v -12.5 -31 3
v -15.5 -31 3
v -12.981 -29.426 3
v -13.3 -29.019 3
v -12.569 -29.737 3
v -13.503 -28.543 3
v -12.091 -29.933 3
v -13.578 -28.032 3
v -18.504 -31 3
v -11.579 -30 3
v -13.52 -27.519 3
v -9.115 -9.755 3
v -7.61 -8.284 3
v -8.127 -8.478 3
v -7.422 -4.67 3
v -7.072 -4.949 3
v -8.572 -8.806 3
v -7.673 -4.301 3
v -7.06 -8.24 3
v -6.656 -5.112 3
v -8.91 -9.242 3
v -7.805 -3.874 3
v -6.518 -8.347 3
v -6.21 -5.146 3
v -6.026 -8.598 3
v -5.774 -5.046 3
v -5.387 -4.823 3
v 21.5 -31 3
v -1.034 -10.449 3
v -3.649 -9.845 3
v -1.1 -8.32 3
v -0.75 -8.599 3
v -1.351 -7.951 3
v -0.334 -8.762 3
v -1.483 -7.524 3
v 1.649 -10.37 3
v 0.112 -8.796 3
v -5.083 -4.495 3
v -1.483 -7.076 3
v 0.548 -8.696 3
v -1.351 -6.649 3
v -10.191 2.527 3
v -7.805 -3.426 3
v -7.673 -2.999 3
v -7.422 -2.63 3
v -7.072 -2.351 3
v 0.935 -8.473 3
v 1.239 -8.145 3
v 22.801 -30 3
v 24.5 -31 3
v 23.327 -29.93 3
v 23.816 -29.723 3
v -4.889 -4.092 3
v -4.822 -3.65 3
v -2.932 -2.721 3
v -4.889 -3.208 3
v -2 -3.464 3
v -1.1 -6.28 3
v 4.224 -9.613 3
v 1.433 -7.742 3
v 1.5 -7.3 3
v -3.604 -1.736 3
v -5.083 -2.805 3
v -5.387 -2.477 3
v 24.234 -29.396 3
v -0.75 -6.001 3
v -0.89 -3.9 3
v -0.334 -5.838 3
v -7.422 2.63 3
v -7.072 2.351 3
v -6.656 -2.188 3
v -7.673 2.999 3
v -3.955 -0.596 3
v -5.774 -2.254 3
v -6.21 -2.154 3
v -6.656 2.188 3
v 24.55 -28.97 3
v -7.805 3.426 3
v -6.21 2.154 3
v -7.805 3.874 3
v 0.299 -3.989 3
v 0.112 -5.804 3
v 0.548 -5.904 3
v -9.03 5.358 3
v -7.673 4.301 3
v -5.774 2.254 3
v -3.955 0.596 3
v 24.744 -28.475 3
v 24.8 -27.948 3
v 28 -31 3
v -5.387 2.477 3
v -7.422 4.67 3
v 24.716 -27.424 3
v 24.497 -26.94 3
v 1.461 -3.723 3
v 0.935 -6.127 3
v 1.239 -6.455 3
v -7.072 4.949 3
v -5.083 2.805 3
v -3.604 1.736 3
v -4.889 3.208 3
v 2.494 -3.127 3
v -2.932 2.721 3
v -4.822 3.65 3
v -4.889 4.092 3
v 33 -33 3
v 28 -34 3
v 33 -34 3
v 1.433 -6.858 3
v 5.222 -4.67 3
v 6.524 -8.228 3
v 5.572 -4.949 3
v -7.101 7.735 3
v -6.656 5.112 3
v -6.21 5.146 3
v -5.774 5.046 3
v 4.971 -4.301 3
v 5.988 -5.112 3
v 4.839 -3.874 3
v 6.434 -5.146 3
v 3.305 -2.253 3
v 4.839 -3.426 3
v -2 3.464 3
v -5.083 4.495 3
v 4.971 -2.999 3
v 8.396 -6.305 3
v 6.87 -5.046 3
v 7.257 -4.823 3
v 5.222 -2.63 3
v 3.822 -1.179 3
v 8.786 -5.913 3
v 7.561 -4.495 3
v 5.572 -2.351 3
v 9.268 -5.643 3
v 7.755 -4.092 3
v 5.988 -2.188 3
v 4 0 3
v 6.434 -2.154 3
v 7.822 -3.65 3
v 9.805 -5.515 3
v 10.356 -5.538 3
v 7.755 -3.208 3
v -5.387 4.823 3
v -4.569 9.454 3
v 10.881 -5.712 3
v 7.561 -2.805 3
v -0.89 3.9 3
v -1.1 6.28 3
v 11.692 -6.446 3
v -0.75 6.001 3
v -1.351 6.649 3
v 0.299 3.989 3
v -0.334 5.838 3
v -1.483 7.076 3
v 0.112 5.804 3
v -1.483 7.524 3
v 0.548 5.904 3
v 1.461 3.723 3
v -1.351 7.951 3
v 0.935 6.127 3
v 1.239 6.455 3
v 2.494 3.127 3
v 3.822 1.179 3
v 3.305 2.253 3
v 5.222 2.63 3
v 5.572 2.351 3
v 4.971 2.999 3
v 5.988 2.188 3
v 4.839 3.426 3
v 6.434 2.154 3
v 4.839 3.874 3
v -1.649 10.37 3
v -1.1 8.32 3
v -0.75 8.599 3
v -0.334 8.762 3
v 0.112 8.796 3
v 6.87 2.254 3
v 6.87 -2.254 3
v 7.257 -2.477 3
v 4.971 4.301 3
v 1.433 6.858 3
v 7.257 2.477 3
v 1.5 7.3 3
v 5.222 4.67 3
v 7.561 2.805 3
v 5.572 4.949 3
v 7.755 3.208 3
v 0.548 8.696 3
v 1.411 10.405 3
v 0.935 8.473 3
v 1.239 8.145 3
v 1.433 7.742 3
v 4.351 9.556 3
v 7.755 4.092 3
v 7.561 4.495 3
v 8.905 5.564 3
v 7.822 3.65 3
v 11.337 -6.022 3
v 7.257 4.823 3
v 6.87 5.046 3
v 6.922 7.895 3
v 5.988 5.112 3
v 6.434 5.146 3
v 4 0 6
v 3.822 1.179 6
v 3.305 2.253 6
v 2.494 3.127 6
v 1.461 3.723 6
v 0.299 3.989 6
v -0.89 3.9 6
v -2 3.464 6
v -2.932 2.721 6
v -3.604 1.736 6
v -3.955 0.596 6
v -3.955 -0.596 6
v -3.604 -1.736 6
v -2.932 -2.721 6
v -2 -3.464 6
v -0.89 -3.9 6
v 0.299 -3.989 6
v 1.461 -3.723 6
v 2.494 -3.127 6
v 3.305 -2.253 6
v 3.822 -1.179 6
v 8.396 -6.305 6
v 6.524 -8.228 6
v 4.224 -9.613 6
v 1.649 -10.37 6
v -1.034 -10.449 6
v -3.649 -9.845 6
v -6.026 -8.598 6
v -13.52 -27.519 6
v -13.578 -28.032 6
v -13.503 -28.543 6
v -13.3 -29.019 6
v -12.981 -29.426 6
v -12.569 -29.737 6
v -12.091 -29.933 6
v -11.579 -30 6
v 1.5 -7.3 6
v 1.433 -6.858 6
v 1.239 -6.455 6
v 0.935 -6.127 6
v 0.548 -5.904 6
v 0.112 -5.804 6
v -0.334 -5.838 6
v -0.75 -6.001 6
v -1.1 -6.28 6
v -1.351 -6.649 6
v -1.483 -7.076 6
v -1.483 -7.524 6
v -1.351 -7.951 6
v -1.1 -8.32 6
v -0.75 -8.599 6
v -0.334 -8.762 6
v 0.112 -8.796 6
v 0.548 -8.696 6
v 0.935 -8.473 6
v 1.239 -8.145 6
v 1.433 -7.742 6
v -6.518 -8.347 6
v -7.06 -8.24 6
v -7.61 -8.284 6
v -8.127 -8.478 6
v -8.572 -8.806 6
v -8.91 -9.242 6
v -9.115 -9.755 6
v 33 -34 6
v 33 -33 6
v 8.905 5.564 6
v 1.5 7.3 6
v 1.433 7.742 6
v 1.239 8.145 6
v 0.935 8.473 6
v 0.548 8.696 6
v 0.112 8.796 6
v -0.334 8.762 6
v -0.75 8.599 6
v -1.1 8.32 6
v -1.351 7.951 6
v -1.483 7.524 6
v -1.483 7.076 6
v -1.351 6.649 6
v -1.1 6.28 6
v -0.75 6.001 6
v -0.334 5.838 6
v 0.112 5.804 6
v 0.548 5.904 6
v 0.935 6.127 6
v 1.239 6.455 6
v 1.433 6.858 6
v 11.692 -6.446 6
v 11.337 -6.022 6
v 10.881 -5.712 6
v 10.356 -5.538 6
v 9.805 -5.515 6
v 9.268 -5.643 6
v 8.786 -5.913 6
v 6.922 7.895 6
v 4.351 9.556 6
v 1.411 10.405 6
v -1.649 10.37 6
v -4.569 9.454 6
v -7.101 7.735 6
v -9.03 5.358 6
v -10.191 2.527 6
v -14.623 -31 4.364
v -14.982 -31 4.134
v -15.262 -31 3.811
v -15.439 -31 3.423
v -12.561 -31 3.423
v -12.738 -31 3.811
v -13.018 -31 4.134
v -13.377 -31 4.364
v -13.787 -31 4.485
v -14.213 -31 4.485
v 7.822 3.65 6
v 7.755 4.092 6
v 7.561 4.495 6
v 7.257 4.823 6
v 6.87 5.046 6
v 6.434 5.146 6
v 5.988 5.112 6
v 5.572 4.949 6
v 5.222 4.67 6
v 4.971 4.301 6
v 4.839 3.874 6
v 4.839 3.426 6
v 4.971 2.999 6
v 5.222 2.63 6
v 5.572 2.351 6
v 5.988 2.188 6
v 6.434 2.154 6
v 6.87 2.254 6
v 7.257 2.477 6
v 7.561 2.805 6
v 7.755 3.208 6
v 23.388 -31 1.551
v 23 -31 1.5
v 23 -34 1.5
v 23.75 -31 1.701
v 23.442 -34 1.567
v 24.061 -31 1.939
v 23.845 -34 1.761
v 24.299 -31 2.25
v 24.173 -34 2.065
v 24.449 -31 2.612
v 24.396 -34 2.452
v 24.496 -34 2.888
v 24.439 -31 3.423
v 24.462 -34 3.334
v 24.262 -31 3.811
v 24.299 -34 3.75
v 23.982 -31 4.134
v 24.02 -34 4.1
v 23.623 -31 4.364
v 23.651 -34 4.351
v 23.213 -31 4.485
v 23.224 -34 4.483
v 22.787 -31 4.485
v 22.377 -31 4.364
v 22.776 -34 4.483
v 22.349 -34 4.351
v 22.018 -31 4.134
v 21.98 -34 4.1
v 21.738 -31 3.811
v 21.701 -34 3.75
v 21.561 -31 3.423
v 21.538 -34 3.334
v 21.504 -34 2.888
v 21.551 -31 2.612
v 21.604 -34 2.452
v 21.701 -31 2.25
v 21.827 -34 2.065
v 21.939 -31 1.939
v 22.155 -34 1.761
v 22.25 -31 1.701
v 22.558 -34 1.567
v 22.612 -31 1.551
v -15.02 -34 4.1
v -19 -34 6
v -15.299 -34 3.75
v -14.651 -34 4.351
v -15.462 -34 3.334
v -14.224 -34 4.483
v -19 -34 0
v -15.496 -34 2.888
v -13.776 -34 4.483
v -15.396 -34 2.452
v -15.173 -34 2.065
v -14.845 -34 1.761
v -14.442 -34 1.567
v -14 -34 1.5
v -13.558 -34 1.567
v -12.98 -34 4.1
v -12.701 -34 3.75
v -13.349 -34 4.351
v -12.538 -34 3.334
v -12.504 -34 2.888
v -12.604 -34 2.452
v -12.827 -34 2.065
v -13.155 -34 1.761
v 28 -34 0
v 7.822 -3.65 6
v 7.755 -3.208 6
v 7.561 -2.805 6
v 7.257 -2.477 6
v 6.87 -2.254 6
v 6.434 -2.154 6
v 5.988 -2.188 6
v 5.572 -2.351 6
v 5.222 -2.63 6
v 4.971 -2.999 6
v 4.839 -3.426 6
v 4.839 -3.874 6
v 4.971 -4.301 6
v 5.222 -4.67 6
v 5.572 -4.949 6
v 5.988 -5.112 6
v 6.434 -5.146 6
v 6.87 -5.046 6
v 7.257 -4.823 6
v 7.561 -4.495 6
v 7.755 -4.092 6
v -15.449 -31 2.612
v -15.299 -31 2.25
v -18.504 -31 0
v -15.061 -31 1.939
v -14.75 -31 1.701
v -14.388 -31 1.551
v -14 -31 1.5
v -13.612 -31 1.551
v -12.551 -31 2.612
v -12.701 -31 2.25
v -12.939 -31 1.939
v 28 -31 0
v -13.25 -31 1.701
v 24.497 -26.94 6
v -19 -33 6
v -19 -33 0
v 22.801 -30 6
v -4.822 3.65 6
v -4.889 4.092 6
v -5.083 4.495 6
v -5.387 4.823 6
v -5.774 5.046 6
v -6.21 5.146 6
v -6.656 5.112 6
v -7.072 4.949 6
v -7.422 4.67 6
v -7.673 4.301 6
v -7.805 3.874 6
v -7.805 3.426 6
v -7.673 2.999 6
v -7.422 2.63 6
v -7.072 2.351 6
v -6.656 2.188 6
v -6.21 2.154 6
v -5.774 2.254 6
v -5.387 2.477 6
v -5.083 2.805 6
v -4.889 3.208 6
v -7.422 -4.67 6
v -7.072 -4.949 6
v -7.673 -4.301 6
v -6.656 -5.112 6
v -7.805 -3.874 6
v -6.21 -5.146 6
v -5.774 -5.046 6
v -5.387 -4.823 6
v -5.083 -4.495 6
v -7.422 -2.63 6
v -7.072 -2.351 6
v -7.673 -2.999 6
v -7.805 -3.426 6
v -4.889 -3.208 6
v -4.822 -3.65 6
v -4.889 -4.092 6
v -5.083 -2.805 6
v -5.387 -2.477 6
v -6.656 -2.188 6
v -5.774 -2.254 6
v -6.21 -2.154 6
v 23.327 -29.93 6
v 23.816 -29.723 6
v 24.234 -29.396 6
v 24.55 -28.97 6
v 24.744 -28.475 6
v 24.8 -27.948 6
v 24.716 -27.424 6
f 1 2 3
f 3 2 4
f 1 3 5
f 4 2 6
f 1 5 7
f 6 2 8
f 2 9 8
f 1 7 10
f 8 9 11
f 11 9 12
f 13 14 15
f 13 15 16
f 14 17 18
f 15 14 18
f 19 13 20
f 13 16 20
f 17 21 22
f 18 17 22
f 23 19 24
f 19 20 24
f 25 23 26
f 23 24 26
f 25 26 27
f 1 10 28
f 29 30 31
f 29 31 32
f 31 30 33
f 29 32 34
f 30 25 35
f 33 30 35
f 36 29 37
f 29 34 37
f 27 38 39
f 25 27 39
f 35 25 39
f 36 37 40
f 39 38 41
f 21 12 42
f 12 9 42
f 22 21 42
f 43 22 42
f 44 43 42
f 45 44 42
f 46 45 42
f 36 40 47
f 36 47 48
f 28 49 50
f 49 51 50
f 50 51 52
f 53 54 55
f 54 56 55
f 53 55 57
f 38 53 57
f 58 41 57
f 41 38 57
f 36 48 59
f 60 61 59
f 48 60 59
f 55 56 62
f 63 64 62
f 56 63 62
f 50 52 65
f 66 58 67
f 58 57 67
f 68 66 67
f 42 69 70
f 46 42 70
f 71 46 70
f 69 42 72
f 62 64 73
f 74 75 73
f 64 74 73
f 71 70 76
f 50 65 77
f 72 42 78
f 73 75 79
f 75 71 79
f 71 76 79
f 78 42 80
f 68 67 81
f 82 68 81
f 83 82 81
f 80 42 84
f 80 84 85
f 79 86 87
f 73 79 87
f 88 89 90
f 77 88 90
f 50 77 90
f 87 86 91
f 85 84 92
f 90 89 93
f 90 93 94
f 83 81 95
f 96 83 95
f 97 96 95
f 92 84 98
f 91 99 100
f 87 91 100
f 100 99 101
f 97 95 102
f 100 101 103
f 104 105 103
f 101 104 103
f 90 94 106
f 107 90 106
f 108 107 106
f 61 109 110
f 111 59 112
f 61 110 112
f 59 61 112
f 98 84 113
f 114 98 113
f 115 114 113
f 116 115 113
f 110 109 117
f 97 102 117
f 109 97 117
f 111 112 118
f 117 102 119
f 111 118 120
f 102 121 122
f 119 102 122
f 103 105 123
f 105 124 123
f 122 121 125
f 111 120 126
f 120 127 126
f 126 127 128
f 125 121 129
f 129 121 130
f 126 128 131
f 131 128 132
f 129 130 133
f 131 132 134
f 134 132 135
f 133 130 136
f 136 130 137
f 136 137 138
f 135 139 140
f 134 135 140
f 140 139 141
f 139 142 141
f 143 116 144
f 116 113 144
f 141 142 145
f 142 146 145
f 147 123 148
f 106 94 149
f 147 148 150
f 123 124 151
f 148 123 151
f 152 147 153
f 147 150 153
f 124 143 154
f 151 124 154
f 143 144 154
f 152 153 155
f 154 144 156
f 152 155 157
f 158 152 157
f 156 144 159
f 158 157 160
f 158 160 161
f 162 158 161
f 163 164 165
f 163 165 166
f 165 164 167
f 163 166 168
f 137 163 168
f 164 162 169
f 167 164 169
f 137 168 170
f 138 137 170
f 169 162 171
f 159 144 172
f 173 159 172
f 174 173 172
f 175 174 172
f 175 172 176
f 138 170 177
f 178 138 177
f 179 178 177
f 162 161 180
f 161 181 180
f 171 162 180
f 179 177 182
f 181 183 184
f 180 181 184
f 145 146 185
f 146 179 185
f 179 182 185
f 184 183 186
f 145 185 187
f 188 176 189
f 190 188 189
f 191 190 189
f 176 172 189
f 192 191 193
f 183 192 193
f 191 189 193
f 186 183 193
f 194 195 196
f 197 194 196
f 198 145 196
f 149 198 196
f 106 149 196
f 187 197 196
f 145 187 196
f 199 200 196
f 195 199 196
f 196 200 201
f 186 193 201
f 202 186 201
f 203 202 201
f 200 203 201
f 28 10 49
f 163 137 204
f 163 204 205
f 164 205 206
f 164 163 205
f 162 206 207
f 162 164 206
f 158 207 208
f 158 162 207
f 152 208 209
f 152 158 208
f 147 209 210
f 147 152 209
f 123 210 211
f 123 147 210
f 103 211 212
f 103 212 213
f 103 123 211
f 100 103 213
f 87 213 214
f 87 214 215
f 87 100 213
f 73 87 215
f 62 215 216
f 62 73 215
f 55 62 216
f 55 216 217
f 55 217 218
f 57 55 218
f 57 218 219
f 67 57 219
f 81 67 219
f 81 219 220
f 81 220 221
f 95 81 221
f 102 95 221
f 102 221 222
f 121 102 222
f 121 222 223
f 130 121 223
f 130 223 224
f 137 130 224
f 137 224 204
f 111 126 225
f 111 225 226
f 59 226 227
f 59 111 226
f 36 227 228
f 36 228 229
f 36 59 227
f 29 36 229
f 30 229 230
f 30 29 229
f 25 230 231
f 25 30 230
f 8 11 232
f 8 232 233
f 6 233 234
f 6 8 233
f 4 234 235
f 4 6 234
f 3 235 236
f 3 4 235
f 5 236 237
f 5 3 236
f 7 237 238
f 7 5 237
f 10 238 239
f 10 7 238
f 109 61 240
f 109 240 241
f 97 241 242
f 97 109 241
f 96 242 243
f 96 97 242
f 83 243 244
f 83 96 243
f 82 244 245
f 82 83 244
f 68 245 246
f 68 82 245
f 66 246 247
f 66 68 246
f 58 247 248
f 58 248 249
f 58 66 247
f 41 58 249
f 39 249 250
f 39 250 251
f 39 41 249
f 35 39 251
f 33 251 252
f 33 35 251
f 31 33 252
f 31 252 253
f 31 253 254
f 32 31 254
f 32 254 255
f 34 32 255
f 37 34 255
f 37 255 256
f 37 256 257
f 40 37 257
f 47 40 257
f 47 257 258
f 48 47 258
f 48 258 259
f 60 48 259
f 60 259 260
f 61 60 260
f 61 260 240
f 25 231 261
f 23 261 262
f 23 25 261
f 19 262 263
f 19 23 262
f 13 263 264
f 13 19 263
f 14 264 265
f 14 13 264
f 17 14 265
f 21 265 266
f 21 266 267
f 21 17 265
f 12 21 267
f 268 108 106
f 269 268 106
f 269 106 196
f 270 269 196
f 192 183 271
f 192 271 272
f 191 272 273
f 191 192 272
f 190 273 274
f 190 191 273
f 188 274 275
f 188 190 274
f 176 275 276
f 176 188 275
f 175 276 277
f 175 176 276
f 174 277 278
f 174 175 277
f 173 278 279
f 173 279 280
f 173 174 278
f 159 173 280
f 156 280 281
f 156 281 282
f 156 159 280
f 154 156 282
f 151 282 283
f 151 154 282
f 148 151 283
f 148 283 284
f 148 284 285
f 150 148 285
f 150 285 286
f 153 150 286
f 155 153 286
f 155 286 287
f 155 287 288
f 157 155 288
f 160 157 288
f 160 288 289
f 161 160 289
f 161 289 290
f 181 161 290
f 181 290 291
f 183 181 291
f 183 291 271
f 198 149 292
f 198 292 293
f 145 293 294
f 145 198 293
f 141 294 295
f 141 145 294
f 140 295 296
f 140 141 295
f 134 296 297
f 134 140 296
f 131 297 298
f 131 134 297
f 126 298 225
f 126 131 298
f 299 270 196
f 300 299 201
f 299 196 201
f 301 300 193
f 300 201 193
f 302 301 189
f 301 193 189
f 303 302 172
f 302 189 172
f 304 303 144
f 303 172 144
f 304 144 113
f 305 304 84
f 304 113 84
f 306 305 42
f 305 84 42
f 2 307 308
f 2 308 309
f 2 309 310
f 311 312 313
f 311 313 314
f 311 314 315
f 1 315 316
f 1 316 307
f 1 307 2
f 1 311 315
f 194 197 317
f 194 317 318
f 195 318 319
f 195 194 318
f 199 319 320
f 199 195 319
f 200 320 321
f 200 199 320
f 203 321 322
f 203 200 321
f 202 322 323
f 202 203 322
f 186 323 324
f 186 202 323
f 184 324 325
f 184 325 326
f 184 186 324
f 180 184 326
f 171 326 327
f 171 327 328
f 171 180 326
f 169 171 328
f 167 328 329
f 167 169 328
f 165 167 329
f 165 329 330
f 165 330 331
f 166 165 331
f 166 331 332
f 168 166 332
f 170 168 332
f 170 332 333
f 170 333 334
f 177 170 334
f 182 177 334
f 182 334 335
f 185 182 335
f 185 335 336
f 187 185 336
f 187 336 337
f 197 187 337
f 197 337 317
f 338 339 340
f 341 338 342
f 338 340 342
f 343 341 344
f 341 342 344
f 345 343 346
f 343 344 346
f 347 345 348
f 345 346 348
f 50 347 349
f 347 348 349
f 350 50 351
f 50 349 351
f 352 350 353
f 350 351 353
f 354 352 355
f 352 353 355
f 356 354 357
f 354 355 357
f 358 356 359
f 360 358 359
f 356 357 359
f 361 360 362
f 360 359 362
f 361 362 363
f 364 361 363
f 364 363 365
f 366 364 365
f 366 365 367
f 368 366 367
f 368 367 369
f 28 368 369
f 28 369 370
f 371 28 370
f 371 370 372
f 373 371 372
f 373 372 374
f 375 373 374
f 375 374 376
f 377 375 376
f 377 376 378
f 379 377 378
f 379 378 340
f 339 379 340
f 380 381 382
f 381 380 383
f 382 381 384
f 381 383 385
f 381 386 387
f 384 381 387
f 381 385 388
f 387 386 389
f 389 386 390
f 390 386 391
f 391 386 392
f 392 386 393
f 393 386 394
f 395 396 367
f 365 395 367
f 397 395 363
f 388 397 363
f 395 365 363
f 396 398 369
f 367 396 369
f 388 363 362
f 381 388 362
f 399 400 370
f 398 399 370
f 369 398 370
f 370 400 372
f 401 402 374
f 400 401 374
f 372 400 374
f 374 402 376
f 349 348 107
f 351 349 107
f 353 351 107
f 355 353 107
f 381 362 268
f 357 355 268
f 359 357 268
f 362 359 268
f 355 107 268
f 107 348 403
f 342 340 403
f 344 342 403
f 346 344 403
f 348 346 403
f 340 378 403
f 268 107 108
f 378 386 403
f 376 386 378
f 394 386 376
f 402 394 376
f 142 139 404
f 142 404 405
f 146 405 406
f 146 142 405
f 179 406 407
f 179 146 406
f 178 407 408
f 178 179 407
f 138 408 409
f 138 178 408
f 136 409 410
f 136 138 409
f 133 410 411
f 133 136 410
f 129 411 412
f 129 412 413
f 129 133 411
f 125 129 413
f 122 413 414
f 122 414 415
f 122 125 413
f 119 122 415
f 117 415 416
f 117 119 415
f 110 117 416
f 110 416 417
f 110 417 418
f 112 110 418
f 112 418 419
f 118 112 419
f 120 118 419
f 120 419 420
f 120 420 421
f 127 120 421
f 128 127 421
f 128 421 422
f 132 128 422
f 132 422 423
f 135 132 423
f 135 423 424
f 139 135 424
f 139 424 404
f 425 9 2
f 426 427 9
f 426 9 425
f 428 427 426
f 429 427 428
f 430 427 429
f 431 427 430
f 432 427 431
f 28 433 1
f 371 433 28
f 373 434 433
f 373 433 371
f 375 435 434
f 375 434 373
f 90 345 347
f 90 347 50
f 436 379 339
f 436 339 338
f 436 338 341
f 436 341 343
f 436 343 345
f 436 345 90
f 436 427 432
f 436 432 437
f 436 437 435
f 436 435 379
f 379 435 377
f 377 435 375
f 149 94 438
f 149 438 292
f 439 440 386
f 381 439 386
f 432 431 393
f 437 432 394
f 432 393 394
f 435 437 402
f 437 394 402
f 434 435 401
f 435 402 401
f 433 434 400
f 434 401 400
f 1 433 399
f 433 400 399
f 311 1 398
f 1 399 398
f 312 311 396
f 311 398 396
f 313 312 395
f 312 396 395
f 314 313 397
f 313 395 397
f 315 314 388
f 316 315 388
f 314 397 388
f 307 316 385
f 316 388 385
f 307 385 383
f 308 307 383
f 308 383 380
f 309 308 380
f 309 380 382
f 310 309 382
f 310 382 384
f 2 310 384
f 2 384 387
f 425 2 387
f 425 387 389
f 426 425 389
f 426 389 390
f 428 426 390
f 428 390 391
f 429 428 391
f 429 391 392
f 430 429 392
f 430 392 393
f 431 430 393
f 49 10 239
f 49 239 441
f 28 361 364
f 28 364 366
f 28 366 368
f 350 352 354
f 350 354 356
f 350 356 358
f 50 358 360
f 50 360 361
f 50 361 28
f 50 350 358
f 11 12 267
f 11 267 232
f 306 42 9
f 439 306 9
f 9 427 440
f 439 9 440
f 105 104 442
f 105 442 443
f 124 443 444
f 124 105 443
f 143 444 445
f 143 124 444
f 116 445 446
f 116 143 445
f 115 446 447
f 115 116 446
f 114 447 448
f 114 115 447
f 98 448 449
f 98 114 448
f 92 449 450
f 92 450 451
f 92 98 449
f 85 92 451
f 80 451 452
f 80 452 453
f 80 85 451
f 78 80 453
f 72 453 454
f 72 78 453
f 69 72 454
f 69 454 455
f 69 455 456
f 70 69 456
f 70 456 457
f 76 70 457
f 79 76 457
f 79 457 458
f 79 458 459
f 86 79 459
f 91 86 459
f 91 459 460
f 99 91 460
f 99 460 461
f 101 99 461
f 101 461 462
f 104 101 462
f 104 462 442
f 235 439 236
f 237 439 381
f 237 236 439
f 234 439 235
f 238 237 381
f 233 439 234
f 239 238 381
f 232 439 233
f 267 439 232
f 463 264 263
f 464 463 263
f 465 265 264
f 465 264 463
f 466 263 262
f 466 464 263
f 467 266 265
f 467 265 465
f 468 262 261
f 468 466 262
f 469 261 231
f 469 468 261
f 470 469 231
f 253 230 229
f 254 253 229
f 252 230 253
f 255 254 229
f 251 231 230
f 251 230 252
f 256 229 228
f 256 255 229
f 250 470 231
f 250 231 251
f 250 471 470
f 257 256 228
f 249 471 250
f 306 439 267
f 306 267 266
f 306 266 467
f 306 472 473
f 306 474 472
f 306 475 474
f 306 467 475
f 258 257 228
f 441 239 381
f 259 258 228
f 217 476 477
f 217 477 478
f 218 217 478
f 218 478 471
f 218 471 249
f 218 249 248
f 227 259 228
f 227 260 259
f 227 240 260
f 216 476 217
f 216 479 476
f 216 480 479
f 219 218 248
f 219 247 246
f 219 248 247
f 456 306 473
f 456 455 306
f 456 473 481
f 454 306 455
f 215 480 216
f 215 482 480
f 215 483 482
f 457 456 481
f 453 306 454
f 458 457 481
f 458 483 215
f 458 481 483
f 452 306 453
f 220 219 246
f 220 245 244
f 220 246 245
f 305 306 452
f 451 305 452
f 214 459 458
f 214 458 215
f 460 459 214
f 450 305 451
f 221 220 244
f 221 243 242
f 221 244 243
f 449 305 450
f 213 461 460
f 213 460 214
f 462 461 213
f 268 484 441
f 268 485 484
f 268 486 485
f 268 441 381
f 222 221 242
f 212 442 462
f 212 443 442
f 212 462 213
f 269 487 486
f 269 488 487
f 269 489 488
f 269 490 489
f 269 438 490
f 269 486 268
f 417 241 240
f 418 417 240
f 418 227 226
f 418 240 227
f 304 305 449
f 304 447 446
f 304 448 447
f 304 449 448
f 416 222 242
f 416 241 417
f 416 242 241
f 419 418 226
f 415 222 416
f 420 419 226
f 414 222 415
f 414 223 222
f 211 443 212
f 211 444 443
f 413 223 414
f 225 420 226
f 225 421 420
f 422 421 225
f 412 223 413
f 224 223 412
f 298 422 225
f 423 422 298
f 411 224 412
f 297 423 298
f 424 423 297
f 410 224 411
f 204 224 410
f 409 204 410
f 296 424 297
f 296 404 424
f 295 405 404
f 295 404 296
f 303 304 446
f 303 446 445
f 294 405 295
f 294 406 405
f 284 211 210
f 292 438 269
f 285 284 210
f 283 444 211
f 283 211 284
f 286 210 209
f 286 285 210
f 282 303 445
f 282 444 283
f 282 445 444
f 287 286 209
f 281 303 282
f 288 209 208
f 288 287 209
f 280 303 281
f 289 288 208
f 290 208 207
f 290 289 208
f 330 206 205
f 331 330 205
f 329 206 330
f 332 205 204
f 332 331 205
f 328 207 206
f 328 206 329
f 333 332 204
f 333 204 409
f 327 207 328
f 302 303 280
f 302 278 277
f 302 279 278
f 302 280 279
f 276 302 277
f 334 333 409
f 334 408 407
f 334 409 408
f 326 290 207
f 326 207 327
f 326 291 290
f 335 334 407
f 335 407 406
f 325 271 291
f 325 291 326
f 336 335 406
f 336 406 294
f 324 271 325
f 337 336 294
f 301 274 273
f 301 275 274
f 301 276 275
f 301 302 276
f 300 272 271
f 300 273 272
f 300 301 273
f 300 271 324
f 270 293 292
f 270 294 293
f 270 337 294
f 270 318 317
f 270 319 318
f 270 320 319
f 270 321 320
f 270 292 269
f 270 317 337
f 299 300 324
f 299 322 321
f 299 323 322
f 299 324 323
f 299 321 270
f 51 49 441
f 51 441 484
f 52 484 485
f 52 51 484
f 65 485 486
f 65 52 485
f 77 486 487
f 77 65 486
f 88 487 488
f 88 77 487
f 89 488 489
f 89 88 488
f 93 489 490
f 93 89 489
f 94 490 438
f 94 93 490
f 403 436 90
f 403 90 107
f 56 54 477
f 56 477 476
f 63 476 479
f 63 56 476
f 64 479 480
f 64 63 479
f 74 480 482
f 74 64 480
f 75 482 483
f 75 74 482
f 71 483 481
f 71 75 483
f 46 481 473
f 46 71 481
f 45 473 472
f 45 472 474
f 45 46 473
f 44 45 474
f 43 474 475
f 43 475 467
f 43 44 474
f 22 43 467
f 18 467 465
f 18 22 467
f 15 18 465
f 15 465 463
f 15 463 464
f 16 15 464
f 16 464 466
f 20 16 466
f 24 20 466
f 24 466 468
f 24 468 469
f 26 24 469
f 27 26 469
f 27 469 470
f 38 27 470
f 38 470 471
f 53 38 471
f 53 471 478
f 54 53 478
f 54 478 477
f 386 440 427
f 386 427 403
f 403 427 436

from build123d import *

# Parameters (mm, degrees)
SKETCH_1_R          = 4
SKETCH_1_R_2        = 1.5
EXTRUDE_1_DEPTH     = 6
SKETCH_4_R          = 1.5
CUT_EXTRUDE_2_DEPTH = 3
CUT_EXTRUDE_3_DEPTH = 3


with BuildPart() as part:
    # 草图1 → 凸台-拉伸1 (new body)
    with BuildSketch(Plane.XY):
        with BuildLine():
            Line((-10.191413347, 2.526874351), (-19, -33))
            Line((-19, -33), (-19, -34))
            Line((-19, -34), (33, -34))
            Line((33, -34), (33, -33))
            Line((33, -33), (8.904718959, 5.563809869))
            ThreePointArc((8.904718959, 5.563809869), (-1.649133089, 10.369684665), (-10.191413347, 2.526874351))
        make_face()
        Circle(SKETCH_1_R, mode=Mode.SUBTRACT)
        with Locations((0, 7.3)):
            Circle(SKETCH_1_R_2, mode=Mode.SUBTRACT)
        with Locations((6.321985448, 3.65)):
            Circle(SKETCH_1_R_2, mode=Mode.SUBTRACT)
        with Locations((6.321985448, -3.65)):
            Circle(SKETCH_1_R_2, mode=Mode.SUBTRACT)
        with Locations((0, -7.3)):
            Circle(SKETCH_1_R_2, mode=Mode.SUBTRACT)
        with Locations((-6.321985448, -3.65)):
            Circle(SKETCH_1_R_2, mode=Mode.SUBTRACT)
        with Locations((-6.321985448, 3.65)):
            Circle(SKETCH_1_R_2, mode=Mode.SUBTRACT)
        with BuildLine():
            Line((-9.115462127, -9.754914157), (-13.519839571, -27.5186906))
            ThreePointArc((-13.519839571, -27.5186906), (-13.153835237, -29.232351654), (-11.578617982, -30))
            Line((-11.578617982, -30), (22.801020138, -30))
            ThreePointArc((22.801020138, -30), (24.55024091, -28.969652872), (24.497157083, -26.940226692))
            Line((24.497157083, -26.940226692), (11.69193225, -6.445829679))
            ThreePointArc((11.69193225, -6.445829679), (10.081363796, -5.507434318), (8.396468057, -6.30470651))
            ThreePointArc((8.396468057, -6.30470651), (1.649133089, -10.369684665), (-6.026362051, -8.598427788))
            ThreePointArc((-6.026362051, -8.598427788), (-7.875463398, -8.363181513), (-9.115462127, -9.754914157))
        make_face(mode=Mode.SUBTRACT)
    extrude(amount=EXTRUDE_1_DEPTH)

    # 草图4 → 切除-拉伸2 (cut)
    with BuildSketch(Plane(origin=(0, -34, 0), x_dir=(-1, 0, 0), z_dir=(0, -1, 0))):
        with Locations(Location((14, -3, 0), (0, 0, 90))):
            Circle(SKETCH_4_R)
        with Locations(Location((-23, -3, 0), (0, 0, 90))):
            Circle(SKETCH_4_R)
    extrude(amount=-CUT_EXTRUDE_2_DEPTH, mode=Mode.SUBTRACT)

    # 草图5 → 切除-拉伸3 (cut)
    with BuildSketch(Plane(origin=(0, 0, 0), x_dir=(-1, 0, 0), z_dir=(0, 0, -1))):
        Polygon((22.848175367, -31), (-28, -31), (-28, -36.198371548), (-37.735885528, -36.198371548), (-37.735885528, 13.676691154), (23.360590395, 13.676691154), (23.360590395, -30.988818766), align=None)
    extrude(amount=-CUT_EXTRUDE_3_DEPTH, mode=Mode.SUBTRACT)


solid = part.part
